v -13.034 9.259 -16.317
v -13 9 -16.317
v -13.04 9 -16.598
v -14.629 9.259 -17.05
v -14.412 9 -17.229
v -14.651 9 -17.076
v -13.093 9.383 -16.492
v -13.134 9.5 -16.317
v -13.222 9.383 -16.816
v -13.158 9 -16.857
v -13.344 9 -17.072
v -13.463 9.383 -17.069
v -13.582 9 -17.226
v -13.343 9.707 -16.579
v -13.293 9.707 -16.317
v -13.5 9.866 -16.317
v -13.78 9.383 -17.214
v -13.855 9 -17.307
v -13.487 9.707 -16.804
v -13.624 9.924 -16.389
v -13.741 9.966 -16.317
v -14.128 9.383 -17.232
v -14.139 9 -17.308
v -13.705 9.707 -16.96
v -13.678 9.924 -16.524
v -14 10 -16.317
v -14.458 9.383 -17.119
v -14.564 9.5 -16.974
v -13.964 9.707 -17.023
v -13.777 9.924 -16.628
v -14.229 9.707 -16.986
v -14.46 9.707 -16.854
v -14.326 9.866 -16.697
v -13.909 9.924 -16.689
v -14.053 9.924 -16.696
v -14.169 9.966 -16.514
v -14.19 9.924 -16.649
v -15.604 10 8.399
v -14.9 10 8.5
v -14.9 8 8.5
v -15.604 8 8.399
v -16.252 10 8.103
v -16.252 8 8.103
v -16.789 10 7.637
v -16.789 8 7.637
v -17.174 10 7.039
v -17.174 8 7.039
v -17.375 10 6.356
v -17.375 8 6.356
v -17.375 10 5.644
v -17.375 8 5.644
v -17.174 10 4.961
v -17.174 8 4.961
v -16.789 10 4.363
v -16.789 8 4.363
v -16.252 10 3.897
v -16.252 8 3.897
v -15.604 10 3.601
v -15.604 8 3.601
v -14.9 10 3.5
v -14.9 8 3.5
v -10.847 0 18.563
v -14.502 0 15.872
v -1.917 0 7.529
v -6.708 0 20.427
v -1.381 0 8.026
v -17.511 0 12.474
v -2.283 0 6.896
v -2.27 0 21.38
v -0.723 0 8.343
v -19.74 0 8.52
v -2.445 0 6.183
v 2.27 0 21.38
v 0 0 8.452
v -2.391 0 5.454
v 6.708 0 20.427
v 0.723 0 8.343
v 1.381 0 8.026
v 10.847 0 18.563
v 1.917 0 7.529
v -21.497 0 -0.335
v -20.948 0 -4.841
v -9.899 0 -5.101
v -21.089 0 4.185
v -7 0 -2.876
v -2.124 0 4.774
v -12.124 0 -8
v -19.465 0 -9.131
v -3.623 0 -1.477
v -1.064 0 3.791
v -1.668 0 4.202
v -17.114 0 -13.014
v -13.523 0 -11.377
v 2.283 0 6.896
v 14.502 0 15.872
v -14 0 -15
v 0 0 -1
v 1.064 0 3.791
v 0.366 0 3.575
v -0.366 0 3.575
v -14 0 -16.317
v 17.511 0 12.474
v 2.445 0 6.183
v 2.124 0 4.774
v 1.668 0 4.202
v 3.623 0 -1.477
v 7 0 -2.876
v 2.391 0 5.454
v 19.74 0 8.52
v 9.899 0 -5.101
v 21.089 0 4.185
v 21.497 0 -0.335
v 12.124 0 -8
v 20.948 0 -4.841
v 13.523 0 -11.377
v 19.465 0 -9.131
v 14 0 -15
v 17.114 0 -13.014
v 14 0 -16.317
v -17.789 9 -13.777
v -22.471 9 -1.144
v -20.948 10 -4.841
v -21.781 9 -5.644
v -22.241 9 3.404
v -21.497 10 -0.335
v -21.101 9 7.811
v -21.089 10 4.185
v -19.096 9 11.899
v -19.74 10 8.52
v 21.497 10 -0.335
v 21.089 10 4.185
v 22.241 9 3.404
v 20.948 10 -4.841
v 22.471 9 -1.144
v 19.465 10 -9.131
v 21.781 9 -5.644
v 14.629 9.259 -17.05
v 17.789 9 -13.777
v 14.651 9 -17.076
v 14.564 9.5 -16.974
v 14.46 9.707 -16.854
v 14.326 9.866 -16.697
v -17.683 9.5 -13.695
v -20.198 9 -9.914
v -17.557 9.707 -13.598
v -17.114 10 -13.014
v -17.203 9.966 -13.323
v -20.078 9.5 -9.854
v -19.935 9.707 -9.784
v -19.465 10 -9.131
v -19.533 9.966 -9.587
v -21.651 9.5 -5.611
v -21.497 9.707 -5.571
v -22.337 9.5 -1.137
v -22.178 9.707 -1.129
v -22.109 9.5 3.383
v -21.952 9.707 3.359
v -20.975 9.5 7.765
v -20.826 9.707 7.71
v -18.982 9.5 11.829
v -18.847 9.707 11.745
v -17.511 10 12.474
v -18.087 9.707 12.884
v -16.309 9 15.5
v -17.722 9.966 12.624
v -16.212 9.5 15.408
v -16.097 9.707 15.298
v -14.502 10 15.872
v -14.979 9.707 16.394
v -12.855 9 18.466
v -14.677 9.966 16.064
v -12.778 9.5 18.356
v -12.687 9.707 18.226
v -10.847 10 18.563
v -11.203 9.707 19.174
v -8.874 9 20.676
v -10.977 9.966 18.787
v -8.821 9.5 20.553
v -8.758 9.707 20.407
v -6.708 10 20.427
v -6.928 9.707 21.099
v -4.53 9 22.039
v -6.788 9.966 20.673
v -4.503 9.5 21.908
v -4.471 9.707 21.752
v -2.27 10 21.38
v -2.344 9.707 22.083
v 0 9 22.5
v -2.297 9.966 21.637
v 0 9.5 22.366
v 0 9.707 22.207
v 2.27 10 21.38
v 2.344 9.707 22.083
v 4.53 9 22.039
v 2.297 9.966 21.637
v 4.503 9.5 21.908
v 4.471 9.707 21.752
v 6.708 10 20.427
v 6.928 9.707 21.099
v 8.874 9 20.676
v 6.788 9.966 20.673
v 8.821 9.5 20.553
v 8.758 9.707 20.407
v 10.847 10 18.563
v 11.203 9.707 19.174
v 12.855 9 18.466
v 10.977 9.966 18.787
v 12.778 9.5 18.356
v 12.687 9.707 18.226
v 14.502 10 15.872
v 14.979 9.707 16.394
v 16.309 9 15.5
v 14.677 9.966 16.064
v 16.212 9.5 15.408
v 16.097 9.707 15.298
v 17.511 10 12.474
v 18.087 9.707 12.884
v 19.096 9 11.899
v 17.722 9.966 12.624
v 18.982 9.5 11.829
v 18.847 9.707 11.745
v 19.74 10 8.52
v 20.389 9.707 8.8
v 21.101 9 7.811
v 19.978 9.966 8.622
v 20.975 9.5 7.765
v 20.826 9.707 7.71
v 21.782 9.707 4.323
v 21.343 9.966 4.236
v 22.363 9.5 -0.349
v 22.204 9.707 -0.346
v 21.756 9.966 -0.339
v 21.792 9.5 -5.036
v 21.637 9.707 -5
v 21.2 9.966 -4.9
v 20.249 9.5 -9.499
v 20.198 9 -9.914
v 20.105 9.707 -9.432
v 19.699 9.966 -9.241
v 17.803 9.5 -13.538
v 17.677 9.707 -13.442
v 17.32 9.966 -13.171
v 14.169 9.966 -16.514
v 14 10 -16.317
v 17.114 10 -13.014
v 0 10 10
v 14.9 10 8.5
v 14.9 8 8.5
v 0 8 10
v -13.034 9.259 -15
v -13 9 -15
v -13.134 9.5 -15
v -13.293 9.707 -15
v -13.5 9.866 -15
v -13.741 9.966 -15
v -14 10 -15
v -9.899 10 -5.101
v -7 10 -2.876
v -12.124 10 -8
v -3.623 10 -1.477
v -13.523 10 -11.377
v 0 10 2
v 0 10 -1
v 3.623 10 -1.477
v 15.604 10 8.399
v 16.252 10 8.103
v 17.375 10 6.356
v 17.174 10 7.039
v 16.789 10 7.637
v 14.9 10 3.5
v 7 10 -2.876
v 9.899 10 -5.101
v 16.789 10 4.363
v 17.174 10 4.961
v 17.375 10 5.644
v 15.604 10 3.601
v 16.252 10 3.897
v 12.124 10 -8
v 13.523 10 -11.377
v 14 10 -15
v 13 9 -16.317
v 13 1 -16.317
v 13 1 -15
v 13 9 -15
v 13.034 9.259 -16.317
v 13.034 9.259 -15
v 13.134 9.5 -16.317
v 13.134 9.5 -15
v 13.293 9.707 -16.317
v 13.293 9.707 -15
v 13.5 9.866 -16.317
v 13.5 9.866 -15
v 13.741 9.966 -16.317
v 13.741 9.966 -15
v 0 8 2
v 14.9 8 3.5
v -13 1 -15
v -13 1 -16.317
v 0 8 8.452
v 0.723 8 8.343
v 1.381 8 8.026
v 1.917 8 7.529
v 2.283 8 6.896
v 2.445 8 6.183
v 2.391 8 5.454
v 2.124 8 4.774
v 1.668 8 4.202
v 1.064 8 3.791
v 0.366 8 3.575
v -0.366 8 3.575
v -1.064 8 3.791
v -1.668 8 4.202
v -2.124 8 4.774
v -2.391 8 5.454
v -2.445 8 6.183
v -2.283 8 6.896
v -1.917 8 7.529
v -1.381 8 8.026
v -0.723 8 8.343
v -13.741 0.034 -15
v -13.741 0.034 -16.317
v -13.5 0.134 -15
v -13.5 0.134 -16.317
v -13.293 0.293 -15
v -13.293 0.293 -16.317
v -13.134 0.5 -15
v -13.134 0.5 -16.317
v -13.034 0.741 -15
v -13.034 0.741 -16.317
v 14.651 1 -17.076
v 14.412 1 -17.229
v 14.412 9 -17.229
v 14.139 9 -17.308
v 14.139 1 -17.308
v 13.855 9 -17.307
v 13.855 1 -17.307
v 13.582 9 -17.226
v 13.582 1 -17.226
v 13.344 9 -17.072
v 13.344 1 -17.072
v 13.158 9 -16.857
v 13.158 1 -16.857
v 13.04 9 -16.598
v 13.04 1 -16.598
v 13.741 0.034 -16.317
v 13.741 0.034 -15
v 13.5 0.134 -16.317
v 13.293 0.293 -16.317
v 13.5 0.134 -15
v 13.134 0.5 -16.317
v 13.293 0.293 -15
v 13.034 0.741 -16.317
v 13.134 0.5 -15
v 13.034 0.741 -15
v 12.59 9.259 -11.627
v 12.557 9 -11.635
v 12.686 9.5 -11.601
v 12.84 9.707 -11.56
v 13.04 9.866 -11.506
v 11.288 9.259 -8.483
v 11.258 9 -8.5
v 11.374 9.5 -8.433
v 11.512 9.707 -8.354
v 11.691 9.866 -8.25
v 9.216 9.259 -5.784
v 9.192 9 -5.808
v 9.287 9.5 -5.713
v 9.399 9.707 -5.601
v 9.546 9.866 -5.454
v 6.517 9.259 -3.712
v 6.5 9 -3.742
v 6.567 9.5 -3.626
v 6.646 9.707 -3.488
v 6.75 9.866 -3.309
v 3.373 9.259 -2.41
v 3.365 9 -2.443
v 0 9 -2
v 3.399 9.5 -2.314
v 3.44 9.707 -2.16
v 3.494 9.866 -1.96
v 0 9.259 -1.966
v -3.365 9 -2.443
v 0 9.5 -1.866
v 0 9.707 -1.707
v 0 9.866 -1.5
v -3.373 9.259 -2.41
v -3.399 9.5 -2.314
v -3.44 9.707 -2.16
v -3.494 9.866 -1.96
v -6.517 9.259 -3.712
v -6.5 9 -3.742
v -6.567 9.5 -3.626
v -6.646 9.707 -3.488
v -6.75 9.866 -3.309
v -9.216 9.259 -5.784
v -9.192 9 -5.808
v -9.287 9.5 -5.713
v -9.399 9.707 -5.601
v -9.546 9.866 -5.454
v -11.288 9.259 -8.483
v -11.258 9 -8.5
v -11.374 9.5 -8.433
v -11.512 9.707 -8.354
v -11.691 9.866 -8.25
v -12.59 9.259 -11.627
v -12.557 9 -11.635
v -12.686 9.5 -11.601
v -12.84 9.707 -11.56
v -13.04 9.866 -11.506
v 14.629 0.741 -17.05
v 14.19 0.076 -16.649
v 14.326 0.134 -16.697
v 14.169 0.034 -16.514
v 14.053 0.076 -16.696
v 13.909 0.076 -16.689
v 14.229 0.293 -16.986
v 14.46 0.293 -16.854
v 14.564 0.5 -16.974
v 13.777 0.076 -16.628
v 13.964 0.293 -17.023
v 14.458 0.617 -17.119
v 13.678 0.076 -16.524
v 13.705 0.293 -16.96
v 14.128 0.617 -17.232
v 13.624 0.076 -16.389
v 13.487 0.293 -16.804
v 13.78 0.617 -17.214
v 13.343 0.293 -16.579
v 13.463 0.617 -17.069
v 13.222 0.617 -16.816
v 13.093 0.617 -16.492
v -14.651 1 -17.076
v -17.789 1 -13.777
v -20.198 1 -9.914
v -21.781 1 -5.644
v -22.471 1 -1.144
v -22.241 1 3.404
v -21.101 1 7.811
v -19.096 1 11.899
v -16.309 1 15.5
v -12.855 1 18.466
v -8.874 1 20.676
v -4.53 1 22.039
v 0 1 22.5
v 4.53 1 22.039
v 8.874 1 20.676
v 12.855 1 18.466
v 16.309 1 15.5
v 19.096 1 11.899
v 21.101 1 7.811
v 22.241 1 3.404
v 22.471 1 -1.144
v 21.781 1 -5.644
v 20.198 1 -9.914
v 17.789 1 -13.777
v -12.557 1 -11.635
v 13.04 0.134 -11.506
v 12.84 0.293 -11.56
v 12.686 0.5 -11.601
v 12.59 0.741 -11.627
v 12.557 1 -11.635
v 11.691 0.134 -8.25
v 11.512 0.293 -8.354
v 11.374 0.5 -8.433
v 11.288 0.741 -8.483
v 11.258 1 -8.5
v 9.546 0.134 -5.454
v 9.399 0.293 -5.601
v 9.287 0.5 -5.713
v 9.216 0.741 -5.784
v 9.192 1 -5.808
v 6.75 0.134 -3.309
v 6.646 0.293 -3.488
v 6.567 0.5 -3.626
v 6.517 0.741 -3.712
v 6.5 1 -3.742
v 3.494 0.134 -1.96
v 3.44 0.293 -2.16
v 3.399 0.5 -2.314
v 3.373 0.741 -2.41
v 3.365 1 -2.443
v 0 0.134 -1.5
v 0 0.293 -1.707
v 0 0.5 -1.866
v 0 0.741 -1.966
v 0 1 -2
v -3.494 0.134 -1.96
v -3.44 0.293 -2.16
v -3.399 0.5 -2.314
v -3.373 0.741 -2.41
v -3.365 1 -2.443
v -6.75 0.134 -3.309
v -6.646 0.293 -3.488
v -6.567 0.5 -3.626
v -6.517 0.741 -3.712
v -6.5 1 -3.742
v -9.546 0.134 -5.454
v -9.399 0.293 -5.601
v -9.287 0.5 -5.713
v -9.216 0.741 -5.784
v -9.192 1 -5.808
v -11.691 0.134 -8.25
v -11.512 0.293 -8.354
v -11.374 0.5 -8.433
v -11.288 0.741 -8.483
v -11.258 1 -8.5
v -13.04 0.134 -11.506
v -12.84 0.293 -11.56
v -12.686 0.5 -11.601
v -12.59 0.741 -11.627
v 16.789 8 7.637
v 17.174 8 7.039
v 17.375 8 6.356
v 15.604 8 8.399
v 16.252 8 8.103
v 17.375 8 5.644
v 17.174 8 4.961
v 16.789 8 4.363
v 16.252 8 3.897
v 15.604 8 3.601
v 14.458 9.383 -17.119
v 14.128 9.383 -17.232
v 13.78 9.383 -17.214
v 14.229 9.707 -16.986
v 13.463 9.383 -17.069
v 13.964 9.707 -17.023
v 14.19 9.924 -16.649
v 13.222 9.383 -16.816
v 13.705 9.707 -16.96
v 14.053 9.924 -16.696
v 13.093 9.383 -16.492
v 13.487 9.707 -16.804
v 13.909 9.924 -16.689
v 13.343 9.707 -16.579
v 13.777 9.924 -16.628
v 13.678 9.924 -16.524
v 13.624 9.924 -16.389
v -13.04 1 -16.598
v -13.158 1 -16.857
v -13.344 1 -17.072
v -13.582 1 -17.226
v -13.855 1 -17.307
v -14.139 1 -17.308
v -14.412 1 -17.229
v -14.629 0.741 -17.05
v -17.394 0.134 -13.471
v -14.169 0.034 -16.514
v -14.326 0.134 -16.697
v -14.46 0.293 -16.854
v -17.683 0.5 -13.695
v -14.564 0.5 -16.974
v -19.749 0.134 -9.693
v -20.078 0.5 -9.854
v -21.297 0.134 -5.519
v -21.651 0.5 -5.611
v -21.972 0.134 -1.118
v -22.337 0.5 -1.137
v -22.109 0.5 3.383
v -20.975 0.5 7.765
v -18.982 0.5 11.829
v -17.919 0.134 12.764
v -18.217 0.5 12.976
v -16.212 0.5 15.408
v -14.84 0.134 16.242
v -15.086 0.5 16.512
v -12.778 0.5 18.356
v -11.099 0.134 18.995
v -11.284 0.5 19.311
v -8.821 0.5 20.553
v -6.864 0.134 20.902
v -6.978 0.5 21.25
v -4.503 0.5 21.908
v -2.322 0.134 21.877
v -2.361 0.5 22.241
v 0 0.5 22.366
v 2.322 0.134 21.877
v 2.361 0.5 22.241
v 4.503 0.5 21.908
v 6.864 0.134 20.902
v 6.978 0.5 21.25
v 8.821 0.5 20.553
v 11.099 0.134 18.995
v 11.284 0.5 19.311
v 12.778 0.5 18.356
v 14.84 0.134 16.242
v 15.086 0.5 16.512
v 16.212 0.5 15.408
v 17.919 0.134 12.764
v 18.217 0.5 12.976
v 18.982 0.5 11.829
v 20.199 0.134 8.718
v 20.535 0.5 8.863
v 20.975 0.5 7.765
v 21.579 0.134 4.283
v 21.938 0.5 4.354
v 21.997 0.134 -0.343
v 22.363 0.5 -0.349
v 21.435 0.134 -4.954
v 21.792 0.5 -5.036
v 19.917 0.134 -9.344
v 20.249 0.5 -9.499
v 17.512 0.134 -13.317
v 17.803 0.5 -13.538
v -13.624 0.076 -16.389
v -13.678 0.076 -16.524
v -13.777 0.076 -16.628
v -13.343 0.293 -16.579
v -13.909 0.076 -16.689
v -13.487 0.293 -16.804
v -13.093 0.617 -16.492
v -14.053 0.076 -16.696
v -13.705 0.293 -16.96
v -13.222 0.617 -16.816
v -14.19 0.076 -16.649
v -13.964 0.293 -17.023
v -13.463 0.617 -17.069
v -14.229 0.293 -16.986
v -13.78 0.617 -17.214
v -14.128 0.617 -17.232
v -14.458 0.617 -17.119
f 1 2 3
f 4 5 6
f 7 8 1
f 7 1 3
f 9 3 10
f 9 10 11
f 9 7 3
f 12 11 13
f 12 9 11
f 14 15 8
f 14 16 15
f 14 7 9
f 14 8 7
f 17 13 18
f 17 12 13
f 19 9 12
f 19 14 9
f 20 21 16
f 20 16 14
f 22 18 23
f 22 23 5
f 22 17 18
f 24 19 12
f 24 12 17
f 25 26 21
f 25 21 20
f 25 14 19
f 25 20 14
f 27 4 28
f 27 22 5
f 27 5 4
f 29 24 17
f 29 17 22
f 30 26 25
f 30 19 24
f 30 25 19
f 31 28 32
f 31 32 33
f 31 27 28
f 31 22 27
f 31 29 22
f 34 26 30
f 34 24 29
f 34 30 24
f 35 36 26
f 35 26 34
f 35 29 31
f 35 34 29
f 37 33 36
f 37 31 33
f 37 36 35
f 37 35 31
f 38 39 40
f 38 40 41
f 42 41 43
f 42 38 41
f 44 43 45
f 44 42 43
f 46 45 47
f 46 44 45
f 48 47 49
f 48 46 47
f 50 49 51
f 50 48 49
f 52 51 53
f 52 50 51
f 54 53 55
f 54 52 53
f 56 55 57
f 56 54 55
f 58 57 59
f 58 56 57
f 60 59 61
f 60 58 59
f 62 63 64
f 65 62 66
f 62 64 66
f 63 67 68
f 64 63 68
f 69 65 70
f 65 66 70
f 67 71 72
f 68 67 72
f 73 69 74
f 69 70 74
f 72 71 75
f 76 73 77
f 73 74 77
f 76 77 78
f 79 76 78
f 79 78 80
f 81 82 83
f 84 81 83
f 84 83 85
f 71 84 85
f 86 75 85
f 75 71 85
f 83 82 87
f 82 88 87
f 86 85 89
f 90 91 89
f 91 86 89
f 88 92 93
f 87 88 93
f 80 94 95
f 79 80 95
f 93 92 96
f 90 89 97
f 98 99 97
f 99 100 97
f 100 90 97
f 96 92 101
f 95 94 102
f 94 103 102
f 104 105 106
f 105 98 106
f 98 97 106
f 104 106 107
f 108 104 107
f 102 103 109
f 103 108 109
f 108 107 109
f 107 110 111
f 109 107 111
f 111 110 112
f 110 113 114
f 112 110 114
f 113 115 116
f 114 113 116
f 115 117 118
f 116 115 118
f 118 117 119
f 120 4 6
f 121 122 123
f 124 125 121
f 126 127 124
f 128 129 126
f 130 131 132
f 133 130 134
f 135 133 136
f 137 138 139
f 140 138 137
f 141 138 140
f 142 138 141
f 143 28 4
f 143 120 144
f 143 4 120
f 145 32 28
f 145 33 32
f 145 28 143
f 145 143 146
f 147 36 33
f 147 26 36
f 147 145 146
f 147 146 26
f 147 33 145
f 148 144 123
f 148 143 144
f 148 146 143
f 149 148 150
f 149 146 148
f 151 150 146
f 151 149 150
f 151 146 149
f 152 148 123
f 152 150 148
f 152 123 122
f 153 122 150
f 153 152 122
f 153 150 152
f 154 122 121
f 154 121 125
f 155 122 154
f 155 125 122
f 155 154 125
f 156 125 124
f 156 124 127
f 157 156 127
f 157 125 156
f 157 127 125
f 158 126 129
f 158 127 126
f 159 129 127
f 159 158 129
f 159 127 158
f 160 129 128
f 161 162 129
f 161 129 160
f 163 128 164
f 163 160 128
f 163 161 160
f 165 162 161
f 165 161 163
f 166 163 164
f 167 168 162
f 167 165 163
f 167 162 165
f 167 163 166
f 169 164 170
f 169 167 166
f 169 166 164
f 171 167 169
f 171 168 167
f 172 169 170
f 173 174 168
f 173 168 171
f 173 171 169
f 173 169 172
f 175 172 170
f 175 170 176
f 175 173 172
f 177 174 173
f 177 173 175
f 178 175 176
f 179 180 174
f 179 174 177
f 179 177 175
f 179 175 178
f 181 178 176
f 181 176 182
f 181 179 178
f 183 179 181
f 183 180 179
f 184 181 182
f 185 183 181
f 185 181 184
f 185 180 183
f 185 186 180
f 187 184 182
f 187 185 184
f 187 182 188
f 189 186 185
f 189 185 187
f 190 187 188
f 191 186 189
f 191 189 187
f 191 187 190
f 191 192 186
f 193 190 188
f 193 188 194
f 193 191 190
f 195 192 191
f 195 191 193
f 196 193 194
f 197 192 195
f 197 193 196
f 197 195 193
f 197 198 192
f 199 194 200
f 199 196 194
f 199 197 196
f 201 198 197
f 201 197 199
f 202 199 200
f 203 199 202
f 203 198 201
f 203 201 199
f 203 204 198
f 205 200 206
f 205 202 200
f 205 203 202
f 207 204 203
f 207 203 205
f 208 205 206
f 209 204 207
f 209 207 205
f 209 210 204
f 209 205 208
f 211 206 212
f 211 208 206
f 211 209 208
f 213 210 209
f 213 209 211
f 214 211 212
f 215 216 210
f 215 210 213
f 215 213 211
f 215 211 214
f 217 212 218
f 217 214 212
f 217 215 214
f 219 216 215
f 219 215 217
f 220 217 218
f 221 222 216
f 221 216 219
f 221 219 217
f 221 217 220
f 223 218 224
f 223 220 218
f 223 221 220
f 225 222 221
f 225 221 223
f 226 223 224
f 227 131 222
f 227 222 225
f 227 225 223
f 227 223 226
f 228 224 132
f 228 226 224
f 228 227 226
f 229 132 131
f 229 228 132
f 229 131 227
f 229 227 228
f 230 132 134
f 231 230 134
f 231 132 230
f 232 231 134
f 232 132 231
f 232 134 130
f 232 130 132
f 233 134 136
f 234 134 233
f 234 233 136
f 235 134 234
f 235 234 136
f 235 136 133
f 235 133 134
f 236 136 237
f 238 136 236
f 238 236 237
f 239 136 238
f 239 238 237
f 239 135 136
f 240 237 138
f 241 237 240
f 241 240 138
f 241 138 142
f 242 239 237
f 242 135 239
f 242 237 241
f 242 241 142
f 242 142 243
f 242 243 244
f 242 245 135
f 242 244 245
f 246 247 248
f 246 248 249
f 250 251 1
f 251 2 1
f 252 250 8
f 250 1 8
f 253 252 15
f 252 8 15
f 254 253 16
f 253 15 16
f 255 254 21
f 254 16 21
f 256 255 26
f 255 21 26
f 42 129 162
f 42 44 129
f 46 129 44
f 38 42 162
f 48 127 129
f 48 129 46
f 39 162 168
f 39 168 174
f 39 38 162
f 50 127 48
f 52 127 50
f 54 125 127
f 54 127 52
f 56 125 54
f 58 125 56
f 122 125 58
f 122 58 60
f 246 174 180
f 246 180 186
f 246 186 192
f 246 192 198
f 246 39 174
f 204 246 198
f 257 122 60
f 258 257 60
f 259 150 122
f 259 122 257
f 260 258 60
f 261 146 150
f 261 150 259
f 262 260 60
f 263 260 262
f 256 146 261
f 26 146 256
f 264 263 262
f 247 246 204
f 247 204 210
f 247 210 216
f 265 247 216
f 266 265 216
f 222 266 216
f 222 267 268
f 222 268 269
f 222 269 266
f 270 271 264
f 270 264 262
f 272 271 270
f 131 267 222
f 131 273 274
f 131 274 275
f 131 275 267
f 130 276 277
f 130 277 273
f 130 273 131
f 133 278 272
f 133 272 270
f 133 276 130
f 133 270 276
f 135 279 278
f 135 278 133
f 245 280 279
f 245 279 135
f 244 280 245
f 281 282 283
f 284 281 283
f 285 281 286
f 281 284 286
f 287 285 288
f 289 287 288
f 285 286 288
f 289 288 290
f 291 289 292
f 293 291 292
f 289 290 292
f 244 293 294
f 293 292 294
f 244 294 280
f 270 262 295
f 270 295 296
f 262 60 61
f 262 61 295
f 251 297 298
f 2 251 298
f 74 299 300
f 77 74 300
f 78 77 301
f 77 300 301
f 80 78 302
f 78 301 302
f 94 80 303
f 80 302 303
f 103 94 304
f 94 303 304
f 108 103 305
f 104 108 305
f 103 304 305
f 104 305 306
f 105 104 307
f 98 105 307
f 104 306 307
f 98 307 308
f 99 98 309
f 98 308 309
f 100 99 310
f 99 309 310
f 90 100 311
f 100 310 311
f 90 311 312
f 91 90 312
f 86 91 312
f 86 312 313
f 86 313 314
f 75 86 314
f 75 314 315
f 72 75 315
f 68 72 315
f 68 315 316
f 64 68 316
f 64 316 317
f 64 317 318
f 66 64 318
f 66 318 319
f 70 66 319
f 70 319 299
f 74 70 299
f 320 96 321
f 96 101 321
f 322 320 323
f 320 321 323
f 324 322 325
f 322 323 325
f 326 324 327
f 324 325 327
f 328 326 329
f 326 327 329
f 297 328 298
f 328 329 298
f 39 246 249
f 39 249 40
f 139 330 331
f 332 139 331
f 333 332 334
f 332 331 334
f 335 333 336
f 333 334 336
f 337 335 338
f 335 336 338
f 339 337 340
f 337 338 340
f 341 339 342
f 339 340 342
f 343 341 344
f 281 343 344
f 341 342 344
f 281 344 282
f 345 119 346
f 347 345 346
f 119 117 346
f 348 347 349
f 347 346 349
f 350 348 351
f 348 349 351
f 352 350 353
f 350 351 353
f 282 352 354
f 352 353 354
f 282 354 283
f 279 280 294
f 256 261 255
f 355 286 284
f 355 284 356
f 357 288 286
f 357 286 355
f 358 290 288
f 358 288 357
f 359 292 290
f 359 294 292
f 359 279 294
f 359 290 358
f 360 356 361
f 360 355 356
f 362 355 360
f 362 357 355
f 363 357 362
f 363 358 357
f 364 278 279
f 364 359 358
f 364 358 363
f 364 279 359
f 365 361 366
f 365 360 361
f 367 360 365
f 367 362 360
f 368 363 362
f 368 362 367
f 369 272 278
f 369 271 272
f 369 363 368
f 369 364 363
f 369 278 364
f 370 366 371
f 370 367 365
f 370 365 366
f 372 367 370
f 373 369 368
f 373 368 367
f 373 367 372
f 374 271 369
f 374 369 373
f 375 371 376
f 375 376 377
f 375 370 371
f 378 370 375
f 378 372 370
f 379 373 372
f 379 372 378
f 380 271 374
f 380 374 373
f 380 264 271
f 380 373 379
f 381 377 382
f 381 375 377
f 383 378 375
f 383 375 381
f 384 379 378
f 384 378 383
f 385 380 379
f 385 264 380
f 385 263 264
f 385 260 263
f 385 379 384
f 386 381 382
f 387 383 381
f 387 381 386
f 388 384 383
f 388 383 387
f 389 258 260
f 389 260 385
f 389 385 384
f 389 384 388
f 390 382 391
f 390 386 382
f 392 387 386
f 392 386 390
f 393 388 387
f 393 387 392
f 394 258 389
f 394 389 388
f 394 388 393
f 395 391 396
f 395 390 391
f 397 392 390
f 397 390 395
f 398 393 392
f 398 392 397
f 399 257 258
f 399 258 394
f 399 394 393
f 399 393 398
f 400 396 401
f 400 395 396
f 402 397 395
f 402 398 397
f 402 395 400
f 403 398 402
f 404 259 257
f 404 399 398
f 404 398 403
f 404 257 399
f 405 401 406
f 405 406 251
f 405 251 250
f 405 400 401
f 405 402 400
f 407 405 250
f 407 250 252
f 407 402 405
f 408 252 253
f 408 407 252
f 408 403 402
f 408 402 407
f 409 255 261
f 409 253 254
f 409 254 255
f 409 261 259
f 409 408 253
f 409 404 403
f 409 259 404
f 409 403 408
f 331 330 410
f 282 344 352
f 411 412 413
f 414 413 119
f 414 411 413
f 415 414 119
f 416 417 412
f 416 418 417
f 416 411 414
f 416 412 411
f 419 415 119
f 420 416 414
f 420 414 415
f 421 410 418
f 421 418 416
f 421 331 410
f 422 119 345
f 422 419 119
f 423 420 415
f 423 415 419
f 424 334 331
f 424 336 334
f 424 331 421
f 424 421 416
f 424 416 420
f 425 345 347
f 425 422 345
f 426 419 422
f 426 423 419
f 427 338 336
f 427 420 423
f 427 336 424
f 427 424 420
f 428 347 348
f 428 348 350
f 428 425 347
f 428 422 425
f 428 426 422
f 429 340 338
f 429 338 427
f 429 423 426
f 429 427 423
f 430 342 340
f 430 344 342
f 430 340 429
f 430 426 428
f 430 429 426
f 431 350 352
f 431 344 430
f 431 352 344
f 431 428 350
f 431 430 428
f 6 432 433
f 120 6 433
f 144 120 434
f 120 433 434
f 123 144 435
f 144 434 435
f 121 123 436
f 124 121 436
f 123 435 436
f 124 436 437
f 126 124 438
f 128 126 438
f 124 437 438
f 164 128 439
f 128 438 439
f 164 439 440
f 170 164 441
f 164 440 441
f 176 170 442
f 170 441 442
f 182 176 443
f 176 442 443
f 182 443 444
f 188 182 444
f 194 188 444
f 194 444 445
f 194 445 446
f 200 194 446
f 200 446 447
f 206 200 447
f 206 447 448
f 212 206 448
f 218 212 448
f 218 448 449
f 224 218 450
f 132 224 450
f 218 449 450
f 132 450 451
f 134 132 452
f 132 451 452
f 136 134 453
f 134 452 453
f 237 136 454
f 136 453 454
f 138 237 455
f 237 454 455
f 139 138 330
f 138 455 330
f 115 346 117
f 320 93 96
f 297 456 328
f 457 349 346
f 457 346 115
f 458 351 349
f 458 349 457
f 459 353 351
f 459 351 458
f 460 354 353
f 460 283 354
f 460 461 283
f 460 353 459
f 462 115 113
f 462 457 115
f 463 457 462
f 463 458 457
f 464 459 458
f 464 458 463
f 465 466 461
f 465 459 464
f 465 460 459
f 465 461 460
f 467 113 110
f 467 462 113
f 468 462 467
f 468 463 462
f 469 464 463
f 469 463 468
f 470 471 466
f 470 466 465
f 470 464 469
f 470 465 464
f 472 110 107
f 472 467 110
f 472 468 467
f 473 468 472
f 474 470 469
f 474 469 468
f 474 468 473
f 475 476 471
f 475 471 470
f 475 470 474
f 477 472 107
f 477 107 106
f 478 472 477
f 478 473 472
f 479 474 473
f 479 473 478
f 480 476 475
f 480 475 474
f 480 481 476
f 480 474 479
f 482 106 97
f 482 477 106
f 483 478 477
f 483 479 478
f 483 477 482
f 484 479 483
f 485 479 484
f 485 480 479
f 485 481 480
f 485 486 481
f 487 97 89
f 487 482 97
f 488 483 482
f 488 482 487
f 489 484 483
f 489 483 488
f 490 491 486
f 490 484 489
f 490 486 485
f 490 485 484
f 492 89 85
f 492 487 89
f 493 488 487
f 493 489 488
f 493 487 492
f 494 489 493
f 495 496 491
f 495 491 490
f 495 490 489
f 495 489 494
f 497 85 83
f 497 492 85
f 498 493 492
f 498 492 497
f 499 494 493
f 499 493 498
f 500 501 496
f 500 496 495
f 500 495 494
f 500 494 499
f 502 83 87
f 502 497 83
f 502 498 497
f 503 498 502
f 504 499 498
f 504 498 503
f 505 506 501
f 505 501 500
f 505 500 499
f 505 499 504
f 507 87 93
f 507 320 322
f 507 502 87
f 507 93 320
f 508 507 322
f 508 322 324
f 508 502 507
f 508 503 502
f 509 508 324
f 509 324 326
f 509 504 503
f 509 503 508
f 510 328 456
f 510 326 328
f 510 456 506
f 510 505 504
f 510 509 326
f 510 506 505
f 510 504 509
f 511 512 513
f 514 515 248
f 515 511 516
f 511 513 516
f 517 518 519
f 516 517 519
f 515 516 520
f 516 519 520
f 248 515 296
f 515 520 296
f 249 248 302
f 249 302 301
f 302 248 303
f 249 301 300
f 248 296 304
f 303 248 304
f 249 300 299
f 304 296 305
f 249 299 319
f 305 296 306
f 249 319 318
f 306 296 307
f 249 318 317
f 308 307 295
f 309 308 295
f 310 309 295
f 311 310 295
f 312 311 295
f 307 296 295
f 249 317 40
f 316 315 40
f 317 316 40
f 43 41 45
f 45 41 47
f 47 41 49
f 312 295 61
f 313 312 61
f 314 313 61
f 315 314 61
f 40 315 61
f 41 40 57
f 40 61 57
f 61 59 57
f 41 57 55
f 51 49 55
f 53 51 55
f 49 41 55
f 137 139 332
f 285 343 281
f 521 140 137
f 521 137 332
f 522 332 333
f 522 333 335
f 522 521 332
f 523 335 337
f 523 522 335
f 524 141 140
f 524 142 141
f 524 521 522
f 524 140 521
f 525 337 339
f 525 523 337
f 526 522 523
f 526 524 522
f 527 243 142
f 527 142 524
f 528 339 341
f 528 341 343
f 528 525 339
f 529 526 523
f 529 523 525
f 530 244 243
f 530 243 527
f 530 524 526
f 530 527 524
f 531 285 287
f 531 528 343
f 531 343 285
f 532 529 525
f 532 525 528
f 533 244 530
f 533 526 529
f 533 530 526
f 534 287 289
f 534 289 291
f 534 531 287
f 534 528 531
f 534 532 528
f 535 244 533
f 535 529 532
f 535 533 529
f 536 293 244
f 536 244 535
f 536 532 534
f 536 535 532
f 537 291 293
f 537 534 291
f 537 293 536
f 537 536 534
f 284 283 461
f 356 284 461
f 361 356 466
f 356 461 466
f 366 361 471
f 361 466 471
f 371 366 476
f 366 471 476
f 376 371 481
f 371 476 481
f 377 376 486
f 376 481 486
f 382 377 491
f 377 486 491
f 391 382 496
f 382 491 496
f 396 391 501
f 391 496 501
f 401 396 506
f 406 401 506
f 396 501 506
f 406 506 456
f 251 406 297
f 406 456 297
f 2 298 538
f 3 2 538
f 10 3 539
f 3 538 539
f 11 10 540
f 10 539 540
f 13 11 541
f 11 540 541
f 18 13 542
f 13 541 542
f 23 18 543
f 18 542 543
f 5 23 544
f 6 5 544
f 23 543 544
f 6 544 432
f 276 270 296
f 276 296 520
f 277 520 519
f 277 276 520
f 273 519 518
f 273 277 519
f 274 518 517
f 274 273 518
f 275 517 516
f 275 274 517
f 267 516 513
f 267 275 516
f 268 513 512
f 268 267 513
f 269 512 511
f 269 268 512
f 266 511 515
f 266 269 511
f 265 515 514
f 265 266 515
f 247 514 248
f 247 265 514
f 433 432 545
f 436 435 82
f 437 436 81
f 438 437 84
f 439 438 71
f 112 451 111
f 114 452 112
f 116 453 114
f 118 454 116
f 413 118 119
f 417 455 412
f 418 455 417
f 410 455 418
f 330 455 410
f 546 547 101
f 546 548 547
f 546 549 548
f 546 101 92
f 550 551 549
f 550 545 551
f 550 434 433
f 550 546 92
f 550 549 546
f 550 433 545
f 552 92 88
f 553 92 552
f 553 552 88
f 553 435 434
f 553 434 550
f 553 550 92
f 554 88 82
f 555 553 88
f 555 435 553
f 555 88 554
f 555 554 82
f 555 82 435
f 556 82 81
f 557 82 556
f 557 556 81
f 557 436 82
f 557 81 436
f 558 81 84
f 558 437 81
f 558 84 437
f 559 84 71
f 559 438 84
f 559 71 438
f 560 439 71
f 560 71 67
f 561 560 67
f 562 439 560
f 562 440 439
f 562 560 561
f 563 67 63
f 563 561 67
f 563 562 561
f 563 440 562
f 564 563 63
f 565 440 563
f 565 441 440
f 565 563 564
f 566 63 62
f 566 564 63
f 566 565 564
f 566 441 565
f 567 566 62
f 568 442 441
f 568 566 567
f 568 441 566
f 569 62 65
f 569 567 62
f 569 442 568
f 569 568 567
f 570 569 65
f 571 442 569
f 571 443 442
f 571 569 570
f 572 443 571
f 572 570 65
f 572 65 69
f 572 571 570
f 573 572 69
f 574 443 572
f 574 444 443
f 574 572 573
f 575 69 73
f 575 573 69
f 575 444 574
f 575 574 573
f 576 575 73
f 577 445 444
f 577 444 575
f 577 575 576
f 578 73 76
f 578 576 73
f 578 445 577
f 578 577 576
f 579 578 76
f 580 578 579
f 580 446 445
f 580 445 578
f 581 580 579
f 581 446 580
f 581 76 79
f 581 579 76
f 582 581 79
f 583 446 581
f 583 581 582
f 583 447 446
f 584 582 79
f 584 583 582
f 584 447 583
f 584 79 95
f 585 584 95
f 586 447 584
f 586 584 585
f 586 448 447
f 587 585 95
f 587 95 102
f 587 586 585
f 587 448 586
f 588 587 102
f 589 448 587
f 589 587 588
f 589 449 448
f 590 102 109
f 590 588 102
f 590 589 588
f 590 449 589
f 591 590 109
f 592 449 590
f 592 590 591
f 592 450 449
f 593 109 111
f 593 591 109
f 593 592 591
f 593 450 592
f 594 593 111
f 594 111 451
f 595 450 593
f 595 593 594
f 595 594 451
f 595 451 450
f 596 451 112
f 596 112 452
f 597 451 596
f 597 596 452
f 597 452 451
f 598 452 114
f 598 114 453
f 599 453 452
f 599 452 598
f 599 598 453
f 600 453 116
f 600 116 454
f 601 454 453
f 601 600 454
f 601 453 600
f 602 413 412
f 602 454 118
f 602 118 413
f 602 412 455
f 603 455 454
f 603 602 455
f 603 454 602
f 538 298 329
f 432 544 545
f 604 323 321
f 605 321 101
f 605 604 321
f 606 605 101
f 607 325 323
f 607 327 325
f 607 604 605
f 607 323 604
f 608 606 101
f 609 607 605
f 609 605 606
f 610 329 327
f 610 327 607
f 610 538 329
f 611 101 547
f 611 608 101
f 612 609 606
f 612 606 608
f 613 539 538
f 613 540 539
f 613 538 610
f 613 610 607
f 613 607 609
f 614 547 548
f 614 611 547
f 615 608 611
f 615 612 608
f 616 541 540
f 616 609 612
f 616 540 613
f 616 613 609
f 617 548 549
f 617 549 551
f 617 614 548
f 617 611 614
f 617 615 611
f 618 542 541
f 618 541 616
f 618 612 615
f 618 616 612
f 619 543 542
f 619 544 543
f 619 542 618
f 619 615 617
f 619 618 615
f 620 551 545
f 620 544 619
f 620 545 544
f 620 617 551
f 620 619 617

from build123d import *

# Parameters (mm, degrees)
BOSS_EXTRUDE1_DEPTH = 10
SKETCH4_R           = 2.452335066
CUT_EXTRUDE2_DEPTH  = 2
SKETCH4_2_R         = 2.452335066
CUT_EXTRUDE3_DEPTH  = 34.35416016
FILLET2_R           = 1


with BuildPart() as part:
    # Sketch2 → Boss-Extrude1 (new body)
    with BuildSketch(Plane(origin=(0, 0, 0), x_dir=(1, 0, 0), z_dir=(0, 1, 0))):
        with BuildLine():
            Line((-13, 15), (-13, 16.317168872))
            ThreePointArc((-13, 16.317168872), (-13.582365465, 17.22578397), (-14.651162791, 17.076106959))
            ThreePointArc((-14.651162791, 17.076106959), (0, -22.5), (14.651162791, 17.076106959))
            ThreePointArc((14.651162791, 17.076106959), (13.582365465, 17.22578397), (13, 16.317168872))
            Line((13, 16.317168872), (13, 15))
            ThreePointArc((13, 15), (0, 2), (-13, 15))
        make_face()
    extrude(amount=BOSS_EXTRUDE1_DEPTH)

    # Sketch4 → Cut-Extrude2 (cut)
    with BuildSketch(Plane(origin=(0, 10, 0), x_dir=(1, 0, 0), z_dir=(0, 1, 0))):
        with BuildLine():
            Line((-14.9, -3.5), (0, -2))
            Line((0, -2), (14.9, -3.5))
            ThreePointArc((14.9, -3.5), (17.4, -6), (14.9, -8.5))
            Line((14.9, -8.5), (0, -10))
            Line((0, -10), (-14.9, -8.5))
            ThreePointArc((-14.9, -8.5), (-17.4, -6), (-14.9, -3.5))
        make_face()
        with Locations((0, -6)):
            Circle(SKETCH4_R, mode=Mode.SUBTRACT)
    extrude(amount=-CUT_EXTRUDE2_DEPTH, mode=Mode.SUBTRACT)

    # Sketch4<2> → Cut-Extrude3 (cut, through all)
    with BuildSketch(Plane(origin=(0, 10, 0), x_dir=(1, 0, 0), z_dir=(0, 1, 0))):
        with Locations((0, -6)):
            Circle(SKETCH4_2_R)
    extrude(amount=-CUT_EXTRUDE3_DEPTH, mode=Mode.SUBTRACT)

    # Fillet2
    fillet2_edges = [part.edges().sort_by_distance(p)[0] for p in [
        (0, 0, 22.5),
        (0, 10, 22.5),
        (0, 0, -2),
        (13, 0, -15.658584436),
        (0, 10, -2),
        (13, 10, -15.658584436),
        (-13, 0, -15.658584436),
        (-13.582365465, 0, -17.22578397),
        (13.582365465, 0, -17.22578397),
        (-13, 10, -15.658584436),
        (-13.582365465, 10, -17.22578397),
        (13.582365465, 10, -17.22578397),
    ]]
    fillet(fillet2_edges, radius=FILLET2_R)


solid = part.part
